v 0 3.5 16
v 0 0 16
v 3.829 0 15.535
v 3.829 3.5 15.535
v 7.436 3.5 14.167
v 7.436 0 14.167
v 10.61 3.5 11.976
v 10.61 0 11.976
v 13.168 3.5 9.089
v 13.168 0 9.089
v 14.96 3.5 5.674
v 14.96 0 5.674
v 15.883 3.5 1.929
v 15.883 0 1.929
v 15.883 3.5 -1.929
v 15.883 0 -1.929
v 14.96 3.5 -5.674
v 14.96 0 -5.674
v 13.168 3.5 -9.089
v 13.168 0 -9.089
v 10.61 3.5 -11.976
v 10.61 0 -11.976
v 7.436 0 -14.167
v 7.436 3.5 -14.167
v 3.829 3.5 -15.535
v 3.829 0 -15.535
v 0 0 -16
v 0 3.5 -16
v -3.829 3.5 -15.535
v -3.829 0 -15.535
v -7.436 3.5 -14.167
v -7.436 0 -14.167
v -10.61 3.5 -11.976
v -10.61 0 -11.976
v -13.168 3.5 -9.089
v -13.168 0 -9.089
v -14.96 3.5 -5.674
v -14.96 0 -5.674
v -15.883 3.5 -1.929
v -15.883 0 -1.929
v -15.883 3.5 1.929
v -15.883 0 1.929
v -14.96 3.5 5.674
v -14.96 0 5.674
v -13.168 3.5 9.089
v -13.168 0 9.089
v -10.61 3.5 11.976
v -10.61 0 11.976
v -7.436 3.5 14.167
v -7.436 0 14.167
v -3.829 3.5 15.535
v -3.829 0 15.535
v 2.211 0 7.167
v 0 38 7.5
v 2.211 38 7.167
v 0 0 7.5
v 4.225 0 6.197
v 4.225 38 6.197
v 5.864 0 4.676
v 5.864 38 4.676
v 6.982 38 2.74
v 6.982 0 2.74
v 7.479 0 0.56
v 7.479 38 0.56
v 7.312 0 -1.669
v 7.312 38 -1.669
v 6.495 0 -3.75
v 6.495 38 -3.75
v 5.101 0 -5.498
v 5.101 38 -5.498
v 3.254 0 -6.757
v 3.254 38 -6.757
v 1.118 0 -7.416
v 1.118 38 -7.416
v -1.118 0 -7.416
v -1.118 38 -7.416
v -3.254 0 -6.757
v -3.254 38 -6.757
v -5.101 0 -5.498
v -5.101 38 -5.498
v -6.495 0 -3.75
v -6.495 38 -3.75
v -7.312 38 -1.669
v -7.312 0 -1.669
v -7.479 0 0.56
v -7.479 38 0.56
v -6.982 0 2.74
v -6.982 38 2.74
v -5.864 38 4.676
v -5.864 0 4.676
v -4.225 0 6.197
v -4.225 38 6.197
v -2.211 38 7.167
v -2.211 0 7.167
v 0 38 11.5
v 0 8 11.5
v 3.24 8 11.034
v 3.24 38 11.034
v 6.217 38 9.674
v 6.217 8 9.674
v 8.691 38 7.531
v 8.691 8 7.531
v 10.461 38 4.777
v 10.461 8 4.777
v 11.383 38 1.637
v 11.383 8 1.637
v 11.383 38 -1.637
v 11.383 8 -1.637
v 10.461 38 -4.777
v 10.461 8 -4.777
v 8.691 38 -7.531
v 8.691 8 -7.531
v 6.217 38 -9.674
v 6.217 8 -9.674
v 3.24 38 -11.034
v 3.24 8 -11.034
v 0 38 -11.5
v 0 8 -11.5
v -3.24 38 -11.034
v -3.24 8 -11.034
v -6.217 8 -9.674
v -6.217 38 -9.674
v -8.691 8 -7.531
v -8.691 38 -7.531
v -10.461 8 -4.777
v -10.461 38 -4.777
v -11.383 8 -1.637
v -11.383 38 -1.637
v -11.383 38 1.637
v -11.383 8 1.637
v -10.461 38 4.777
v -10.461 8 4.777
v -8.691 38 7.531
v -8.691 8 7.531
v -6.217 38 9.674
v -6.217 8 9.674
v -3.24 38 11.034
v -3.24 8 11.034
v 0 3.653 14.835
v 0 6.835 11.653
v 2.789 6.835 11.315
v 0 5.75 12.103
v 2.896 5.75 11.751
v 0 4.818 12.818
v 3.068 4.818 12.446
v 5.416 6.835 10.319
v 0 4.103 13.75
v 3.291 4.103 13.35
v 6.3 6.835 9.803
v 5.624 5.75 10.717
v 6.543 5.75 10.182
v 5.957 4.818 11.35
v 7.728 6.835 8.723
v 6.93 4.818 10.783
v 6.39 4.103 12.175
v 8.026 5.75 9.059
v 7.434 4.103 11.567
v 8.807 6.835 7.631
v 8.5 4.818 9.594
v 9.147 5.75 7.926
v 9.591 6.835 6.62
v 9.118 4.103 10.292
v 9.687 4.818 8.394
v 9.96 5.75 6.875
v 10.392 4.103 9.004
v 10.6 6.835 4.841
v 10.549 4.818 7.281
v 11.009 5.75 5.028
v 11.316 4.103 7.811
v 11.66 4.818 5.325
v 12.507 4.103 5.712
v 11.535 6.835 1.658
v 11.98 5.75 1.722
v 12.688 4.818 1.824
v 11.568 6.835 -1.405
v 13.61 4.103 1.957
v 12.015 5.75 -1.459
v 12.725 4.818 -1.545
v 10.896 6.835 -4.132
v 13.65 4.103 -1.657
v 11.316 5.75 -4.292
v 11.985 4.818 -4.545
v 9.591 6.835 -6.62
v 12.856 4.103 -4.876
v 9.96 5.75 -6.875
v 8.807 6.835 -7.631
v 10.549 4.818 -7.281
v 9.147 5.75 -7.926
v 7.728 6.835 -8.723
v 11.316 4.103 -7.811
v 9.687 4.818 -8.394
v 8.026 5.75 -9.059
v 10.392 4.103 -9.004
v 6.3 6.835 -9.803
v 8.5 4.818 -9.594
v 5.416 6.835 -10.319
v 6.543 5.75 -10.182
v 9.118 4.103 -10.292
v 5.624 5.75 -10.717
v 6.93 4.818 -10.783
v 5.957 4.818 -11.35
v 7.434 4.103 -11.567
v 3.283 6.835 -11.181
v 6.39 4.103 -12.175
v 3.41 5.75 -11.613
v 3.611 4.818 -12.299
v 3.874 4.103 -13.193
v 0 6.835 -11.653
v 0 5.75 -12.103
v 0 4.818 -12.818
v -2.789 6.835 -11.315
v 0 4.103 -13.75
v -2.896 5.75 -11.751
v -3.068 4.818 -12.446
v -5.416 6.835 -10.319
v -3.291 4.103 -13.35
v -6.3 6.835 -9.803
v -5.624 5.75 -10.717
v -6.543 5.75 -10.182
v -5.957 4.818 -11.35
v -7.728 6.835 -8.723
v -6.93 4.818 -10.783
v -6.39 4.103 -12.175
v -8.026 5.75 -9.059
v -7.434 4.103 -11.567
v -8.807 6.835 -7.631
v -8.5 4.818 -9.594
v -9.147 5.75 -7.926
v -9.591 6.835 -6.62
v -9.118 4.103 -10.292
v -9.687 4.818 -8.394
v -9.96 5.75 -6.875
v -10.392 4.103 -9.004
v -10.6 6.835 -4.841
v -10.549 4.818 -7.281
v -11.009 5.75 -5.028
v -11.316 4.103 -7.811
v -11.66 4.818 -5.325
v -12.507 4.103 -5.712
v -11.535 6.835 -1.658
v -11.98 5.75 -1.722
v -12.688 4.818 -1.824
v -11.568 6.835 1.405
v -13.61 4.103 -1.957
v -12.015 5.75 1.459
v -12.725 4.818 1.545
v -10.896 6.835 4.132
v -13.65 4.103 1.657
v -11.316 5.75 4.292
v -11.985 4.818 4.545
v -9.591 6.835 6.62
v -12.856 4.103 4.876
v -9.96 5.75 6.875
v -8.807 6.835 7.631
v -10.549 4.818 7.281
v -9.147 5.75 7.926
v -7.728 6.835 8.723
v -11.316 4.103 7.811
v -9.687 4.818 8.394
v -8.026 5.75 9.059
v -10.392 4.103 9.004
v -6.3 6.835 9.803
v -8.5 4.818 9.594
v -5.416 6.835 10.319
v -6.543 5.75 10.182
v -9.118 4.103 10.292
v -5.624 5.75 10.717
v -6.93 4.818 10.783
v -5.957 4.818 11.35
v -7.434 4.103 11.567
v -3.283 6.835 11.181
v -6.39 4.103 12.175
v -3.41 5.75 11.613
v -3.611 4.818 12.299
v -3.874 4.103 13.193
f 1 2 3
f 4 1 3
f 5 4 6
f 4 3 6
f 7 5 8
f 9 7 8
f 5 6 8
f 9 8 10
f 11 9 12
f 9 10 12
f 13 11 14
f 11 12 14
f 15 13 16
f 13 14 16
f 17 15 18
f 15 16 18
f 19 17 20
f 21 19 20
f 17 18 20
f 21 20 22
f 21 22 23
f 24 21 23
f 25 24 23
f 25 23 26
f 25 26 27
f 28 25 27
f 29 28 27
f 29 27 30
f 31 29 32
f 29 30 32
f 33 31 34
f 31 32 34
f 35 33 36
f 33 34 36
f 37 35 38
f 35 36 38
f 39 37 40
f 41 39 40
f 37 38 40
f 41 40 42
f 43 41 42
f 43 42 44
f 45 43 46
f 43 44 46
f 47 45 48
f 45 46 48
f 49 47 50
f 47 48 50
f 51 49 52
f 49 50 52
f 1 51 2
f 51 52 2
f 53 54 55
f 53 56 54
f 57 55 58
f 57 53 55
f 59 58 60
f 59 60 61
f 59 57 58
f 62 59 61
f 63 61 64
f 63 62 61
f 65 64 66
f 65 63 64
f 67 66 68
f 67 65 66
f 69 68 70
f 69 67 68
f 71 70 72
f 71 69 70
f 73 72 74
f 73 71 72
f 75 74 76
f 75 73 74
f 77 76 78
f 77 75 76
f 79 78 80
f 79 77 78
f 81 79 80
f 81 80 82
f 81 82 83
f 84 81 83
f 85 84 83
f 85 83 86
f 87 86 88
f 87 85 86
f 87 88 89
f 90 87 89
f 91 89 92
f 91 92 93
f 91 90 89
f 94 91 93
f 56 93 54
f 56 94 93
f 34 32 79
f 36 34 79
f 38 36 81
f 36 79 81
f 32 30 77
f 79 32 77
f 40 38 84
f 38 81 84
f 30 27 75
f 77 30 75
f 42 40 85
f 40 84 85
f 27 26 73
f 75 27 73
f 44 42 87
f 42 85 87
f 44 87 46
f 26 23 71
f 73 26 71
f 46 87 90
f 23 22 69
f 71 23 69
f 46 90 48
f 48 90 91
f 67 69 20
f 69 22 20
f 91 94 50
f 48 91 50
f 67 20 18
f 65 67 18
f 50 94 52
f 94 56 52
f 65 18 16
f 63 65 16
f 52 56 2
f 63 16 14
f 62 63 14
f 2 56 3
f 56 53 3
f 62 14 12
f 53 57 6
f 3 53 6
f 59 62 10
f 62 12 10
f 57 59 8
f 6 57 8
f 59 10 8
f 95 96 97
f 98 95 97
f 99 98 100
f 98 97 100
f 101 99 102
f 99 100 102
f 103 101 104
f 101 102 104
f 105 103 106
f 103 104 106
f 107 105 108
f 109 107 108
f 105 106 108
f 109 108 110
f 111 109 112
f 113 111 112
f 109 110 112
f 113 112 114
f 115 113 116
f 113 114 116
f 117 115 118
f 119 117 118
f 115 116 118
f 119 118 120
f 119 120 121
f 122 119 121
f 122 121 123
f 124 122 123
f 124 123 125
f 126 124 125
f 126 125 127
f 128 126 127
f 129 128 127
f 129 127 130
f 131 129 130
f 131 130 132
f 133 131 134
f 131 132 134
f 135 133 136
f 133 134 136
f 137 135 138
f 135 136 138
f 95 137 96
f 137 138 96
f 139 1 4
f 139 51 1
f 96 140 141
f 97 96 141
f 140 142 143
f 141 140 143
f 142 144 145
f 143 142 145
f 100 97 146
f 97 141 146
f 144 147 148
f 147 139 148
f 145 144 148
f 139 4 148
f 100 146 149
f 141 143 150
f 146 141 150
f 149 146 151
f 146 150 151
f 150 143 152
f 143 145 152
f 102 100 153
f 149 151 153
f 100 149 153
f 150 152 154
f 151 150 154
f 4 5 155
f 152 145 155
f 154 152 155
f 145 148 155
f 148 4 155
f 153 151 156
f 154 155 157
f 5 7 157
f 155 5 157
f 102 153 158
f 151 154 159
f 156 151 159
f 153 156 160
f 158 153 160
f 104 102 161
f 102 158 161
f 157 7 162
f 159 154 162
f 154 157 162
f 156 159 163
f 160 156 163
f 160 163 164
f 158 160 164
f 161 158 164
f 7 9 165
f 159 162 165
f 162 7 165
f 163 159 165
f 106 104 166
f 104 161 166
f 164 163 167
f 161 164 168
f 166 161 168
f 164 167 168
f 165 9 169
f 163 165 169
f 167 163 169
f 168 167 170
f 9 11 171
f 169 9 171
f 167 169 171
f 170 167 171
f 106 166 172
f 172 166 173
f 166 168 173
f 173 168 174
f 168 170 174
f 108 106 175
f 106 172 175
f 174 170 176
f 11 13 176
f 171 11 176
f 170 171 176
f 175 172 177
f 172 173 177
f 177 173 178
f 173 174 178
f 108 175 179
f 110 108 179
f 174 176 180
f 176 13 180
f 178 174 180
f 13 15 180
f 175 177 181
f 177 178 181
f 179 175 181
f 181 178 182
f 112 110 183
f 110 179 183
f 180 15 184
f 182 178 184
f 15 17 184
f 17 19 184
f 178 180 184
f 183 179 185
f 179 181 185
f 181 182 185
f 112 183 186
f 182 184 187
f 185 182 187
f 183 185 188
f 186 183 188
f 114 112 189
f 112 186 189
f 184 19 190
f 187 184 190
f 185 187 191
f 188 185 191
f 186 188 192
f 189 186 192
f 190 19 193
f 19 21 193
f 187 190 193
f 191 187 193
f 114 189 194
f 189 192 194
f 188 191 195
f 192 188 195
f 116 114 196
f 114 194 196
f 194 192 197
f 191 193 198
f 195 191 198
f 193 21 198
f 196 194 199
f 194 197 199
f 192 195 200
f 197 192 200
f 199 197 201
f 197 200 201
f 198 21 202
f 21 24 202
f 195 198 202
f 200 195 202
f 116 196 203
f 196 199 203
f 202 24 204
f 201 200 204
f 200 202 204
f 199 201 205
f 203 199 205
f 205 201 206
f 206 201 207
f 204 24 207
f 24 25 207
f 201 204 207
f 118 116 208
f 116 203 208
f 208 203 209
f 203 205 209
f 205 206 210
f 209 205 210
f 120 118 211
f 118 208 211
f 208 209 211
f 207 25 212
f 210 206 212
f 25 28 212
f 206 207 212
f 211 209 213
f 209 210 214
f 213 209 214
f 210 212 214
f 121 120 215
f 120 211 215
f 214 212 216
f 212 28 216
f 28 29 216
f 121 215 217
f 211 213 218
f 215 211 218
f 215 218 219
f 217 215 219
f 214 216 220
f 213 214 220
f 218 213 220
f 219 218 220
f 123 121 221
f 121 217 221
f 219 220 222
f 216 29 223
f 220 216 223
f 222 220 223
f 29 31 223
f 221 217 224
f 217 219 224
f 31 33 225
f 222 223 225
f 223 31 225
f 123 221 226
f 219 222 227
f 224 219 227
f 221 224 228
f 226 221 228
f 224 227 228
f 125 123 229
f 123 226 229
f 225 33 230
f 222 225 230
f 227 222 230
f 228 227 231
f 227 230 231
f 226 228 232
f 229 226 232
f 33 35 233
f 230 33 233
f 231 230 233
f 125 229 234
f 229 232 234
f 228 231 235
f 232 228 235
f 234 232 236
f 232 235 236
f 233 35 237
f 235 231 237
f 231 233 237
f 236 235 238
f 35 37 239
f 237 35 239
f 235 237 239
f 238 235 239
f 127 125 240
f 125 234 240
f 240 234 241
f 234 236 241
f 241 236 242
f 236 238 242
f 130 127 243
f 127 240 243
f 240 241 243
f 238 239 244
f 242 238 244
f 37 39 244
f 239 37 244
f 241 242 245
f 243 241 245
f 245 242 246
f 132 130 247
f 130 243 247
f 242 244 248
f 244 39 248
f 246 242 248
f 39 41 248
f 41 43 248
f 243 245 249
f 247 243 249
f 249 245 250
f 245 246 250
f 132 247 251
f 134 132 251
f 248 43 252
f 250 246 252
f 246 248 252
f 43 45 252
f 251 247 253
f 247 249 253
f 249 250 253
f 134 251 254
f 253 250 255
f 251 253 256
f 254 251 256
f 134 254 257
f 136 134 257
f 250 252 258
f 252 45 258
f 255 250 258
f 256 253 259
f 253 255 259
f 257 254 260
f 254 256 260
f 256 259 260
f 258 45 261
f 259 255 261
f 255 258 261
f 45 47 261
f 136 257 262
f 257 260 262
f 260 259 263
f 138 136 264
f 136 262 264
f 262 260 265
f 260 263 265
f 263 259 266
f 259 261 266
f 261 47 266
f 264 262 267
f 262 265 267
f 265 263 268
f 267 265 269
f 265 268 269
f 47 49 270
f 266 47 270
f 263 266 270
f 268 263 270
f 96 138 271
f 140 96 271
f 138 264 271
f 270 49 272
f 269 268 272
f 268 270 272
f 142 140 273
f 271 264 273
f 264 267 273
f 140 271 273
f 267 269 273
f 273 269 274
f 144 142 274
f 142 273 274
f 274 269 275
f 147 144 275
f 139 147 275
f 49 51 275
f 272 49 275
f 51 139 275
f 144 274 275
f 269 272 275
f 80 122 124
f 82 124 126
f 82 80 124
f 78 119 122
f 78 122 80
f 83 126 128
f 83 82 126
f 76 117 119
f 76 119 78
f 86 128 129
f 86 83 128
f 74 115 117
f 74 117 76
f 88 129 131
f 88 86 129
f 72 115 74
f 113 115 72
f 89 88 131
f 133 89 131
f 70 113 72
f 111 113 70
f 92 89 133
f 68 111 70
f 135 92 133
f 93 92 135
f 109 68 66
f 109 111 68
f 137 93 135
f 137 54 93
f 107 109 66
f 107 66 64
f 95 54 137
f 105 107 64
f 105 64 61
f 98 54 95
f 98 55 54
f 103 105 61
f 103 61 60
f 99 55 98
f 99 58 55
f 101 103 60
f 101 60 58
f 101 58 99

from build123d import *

# Parameters (mm, degrees)
SKETCH_1_R      = 16
SKETCH_1_R_2    = 7.5
EXTRUDE_1_DEPTH = 3.5
SKETCH_2_R      = 11.5
SKETCH_2_R_2    = 7.5
EXTRUDE_2_DEPTH = 34.5
FILLET_3_R      = 4.5


with BuildPart() as part:
    # 草圖1 → 填料-伸長1 (new body)
    with BuildSketch(Plane(origin=(0, 0, 0), x_dir=(1, 0, 0), z_dir=(0, 1, 0))):
        with Locations(Location((0, 0, 0), (0, 0, 270))):
            Circle(SKETCH_1_R)
        with Locations(Location((0, 0, 0), (0, 0, 270))):
            Circle(SKETCH_1_R_2, mode=Mode.SUBTRACT)
    extrude(amount=EXTRUDE_1_DEPTH)

    # 草圖2 → 填料-伸長2 (add)
    with BuildSketch(Plane(origin=(0, 3.5, 0), x_dir=(1, 0, 0), z_dir=(0, 1, 0))):
        with Locations(Location((0, 0, 0), (0, 0, 270))):
            Circle(SKETCH_2_R)
        with Locations(Location((0, 0, 0), (0, 0, 270))):
            Circle(SKETCH_2_R_2, mode=Mode.SUBTRACT)
    extrude(amount=EXTRUDE_2_DEPTH)

    # 圓角3
    fillet_3_edges = [part.edges().sort_by_distance(p)[0] for p in [
        (0, 3.5, -11.5),
    ]]
    fillet(fillet_3_edges, radius=FILLET_3_R - 0.0001)  # a hair under: the kernel refuses the full size


solid = part.part
